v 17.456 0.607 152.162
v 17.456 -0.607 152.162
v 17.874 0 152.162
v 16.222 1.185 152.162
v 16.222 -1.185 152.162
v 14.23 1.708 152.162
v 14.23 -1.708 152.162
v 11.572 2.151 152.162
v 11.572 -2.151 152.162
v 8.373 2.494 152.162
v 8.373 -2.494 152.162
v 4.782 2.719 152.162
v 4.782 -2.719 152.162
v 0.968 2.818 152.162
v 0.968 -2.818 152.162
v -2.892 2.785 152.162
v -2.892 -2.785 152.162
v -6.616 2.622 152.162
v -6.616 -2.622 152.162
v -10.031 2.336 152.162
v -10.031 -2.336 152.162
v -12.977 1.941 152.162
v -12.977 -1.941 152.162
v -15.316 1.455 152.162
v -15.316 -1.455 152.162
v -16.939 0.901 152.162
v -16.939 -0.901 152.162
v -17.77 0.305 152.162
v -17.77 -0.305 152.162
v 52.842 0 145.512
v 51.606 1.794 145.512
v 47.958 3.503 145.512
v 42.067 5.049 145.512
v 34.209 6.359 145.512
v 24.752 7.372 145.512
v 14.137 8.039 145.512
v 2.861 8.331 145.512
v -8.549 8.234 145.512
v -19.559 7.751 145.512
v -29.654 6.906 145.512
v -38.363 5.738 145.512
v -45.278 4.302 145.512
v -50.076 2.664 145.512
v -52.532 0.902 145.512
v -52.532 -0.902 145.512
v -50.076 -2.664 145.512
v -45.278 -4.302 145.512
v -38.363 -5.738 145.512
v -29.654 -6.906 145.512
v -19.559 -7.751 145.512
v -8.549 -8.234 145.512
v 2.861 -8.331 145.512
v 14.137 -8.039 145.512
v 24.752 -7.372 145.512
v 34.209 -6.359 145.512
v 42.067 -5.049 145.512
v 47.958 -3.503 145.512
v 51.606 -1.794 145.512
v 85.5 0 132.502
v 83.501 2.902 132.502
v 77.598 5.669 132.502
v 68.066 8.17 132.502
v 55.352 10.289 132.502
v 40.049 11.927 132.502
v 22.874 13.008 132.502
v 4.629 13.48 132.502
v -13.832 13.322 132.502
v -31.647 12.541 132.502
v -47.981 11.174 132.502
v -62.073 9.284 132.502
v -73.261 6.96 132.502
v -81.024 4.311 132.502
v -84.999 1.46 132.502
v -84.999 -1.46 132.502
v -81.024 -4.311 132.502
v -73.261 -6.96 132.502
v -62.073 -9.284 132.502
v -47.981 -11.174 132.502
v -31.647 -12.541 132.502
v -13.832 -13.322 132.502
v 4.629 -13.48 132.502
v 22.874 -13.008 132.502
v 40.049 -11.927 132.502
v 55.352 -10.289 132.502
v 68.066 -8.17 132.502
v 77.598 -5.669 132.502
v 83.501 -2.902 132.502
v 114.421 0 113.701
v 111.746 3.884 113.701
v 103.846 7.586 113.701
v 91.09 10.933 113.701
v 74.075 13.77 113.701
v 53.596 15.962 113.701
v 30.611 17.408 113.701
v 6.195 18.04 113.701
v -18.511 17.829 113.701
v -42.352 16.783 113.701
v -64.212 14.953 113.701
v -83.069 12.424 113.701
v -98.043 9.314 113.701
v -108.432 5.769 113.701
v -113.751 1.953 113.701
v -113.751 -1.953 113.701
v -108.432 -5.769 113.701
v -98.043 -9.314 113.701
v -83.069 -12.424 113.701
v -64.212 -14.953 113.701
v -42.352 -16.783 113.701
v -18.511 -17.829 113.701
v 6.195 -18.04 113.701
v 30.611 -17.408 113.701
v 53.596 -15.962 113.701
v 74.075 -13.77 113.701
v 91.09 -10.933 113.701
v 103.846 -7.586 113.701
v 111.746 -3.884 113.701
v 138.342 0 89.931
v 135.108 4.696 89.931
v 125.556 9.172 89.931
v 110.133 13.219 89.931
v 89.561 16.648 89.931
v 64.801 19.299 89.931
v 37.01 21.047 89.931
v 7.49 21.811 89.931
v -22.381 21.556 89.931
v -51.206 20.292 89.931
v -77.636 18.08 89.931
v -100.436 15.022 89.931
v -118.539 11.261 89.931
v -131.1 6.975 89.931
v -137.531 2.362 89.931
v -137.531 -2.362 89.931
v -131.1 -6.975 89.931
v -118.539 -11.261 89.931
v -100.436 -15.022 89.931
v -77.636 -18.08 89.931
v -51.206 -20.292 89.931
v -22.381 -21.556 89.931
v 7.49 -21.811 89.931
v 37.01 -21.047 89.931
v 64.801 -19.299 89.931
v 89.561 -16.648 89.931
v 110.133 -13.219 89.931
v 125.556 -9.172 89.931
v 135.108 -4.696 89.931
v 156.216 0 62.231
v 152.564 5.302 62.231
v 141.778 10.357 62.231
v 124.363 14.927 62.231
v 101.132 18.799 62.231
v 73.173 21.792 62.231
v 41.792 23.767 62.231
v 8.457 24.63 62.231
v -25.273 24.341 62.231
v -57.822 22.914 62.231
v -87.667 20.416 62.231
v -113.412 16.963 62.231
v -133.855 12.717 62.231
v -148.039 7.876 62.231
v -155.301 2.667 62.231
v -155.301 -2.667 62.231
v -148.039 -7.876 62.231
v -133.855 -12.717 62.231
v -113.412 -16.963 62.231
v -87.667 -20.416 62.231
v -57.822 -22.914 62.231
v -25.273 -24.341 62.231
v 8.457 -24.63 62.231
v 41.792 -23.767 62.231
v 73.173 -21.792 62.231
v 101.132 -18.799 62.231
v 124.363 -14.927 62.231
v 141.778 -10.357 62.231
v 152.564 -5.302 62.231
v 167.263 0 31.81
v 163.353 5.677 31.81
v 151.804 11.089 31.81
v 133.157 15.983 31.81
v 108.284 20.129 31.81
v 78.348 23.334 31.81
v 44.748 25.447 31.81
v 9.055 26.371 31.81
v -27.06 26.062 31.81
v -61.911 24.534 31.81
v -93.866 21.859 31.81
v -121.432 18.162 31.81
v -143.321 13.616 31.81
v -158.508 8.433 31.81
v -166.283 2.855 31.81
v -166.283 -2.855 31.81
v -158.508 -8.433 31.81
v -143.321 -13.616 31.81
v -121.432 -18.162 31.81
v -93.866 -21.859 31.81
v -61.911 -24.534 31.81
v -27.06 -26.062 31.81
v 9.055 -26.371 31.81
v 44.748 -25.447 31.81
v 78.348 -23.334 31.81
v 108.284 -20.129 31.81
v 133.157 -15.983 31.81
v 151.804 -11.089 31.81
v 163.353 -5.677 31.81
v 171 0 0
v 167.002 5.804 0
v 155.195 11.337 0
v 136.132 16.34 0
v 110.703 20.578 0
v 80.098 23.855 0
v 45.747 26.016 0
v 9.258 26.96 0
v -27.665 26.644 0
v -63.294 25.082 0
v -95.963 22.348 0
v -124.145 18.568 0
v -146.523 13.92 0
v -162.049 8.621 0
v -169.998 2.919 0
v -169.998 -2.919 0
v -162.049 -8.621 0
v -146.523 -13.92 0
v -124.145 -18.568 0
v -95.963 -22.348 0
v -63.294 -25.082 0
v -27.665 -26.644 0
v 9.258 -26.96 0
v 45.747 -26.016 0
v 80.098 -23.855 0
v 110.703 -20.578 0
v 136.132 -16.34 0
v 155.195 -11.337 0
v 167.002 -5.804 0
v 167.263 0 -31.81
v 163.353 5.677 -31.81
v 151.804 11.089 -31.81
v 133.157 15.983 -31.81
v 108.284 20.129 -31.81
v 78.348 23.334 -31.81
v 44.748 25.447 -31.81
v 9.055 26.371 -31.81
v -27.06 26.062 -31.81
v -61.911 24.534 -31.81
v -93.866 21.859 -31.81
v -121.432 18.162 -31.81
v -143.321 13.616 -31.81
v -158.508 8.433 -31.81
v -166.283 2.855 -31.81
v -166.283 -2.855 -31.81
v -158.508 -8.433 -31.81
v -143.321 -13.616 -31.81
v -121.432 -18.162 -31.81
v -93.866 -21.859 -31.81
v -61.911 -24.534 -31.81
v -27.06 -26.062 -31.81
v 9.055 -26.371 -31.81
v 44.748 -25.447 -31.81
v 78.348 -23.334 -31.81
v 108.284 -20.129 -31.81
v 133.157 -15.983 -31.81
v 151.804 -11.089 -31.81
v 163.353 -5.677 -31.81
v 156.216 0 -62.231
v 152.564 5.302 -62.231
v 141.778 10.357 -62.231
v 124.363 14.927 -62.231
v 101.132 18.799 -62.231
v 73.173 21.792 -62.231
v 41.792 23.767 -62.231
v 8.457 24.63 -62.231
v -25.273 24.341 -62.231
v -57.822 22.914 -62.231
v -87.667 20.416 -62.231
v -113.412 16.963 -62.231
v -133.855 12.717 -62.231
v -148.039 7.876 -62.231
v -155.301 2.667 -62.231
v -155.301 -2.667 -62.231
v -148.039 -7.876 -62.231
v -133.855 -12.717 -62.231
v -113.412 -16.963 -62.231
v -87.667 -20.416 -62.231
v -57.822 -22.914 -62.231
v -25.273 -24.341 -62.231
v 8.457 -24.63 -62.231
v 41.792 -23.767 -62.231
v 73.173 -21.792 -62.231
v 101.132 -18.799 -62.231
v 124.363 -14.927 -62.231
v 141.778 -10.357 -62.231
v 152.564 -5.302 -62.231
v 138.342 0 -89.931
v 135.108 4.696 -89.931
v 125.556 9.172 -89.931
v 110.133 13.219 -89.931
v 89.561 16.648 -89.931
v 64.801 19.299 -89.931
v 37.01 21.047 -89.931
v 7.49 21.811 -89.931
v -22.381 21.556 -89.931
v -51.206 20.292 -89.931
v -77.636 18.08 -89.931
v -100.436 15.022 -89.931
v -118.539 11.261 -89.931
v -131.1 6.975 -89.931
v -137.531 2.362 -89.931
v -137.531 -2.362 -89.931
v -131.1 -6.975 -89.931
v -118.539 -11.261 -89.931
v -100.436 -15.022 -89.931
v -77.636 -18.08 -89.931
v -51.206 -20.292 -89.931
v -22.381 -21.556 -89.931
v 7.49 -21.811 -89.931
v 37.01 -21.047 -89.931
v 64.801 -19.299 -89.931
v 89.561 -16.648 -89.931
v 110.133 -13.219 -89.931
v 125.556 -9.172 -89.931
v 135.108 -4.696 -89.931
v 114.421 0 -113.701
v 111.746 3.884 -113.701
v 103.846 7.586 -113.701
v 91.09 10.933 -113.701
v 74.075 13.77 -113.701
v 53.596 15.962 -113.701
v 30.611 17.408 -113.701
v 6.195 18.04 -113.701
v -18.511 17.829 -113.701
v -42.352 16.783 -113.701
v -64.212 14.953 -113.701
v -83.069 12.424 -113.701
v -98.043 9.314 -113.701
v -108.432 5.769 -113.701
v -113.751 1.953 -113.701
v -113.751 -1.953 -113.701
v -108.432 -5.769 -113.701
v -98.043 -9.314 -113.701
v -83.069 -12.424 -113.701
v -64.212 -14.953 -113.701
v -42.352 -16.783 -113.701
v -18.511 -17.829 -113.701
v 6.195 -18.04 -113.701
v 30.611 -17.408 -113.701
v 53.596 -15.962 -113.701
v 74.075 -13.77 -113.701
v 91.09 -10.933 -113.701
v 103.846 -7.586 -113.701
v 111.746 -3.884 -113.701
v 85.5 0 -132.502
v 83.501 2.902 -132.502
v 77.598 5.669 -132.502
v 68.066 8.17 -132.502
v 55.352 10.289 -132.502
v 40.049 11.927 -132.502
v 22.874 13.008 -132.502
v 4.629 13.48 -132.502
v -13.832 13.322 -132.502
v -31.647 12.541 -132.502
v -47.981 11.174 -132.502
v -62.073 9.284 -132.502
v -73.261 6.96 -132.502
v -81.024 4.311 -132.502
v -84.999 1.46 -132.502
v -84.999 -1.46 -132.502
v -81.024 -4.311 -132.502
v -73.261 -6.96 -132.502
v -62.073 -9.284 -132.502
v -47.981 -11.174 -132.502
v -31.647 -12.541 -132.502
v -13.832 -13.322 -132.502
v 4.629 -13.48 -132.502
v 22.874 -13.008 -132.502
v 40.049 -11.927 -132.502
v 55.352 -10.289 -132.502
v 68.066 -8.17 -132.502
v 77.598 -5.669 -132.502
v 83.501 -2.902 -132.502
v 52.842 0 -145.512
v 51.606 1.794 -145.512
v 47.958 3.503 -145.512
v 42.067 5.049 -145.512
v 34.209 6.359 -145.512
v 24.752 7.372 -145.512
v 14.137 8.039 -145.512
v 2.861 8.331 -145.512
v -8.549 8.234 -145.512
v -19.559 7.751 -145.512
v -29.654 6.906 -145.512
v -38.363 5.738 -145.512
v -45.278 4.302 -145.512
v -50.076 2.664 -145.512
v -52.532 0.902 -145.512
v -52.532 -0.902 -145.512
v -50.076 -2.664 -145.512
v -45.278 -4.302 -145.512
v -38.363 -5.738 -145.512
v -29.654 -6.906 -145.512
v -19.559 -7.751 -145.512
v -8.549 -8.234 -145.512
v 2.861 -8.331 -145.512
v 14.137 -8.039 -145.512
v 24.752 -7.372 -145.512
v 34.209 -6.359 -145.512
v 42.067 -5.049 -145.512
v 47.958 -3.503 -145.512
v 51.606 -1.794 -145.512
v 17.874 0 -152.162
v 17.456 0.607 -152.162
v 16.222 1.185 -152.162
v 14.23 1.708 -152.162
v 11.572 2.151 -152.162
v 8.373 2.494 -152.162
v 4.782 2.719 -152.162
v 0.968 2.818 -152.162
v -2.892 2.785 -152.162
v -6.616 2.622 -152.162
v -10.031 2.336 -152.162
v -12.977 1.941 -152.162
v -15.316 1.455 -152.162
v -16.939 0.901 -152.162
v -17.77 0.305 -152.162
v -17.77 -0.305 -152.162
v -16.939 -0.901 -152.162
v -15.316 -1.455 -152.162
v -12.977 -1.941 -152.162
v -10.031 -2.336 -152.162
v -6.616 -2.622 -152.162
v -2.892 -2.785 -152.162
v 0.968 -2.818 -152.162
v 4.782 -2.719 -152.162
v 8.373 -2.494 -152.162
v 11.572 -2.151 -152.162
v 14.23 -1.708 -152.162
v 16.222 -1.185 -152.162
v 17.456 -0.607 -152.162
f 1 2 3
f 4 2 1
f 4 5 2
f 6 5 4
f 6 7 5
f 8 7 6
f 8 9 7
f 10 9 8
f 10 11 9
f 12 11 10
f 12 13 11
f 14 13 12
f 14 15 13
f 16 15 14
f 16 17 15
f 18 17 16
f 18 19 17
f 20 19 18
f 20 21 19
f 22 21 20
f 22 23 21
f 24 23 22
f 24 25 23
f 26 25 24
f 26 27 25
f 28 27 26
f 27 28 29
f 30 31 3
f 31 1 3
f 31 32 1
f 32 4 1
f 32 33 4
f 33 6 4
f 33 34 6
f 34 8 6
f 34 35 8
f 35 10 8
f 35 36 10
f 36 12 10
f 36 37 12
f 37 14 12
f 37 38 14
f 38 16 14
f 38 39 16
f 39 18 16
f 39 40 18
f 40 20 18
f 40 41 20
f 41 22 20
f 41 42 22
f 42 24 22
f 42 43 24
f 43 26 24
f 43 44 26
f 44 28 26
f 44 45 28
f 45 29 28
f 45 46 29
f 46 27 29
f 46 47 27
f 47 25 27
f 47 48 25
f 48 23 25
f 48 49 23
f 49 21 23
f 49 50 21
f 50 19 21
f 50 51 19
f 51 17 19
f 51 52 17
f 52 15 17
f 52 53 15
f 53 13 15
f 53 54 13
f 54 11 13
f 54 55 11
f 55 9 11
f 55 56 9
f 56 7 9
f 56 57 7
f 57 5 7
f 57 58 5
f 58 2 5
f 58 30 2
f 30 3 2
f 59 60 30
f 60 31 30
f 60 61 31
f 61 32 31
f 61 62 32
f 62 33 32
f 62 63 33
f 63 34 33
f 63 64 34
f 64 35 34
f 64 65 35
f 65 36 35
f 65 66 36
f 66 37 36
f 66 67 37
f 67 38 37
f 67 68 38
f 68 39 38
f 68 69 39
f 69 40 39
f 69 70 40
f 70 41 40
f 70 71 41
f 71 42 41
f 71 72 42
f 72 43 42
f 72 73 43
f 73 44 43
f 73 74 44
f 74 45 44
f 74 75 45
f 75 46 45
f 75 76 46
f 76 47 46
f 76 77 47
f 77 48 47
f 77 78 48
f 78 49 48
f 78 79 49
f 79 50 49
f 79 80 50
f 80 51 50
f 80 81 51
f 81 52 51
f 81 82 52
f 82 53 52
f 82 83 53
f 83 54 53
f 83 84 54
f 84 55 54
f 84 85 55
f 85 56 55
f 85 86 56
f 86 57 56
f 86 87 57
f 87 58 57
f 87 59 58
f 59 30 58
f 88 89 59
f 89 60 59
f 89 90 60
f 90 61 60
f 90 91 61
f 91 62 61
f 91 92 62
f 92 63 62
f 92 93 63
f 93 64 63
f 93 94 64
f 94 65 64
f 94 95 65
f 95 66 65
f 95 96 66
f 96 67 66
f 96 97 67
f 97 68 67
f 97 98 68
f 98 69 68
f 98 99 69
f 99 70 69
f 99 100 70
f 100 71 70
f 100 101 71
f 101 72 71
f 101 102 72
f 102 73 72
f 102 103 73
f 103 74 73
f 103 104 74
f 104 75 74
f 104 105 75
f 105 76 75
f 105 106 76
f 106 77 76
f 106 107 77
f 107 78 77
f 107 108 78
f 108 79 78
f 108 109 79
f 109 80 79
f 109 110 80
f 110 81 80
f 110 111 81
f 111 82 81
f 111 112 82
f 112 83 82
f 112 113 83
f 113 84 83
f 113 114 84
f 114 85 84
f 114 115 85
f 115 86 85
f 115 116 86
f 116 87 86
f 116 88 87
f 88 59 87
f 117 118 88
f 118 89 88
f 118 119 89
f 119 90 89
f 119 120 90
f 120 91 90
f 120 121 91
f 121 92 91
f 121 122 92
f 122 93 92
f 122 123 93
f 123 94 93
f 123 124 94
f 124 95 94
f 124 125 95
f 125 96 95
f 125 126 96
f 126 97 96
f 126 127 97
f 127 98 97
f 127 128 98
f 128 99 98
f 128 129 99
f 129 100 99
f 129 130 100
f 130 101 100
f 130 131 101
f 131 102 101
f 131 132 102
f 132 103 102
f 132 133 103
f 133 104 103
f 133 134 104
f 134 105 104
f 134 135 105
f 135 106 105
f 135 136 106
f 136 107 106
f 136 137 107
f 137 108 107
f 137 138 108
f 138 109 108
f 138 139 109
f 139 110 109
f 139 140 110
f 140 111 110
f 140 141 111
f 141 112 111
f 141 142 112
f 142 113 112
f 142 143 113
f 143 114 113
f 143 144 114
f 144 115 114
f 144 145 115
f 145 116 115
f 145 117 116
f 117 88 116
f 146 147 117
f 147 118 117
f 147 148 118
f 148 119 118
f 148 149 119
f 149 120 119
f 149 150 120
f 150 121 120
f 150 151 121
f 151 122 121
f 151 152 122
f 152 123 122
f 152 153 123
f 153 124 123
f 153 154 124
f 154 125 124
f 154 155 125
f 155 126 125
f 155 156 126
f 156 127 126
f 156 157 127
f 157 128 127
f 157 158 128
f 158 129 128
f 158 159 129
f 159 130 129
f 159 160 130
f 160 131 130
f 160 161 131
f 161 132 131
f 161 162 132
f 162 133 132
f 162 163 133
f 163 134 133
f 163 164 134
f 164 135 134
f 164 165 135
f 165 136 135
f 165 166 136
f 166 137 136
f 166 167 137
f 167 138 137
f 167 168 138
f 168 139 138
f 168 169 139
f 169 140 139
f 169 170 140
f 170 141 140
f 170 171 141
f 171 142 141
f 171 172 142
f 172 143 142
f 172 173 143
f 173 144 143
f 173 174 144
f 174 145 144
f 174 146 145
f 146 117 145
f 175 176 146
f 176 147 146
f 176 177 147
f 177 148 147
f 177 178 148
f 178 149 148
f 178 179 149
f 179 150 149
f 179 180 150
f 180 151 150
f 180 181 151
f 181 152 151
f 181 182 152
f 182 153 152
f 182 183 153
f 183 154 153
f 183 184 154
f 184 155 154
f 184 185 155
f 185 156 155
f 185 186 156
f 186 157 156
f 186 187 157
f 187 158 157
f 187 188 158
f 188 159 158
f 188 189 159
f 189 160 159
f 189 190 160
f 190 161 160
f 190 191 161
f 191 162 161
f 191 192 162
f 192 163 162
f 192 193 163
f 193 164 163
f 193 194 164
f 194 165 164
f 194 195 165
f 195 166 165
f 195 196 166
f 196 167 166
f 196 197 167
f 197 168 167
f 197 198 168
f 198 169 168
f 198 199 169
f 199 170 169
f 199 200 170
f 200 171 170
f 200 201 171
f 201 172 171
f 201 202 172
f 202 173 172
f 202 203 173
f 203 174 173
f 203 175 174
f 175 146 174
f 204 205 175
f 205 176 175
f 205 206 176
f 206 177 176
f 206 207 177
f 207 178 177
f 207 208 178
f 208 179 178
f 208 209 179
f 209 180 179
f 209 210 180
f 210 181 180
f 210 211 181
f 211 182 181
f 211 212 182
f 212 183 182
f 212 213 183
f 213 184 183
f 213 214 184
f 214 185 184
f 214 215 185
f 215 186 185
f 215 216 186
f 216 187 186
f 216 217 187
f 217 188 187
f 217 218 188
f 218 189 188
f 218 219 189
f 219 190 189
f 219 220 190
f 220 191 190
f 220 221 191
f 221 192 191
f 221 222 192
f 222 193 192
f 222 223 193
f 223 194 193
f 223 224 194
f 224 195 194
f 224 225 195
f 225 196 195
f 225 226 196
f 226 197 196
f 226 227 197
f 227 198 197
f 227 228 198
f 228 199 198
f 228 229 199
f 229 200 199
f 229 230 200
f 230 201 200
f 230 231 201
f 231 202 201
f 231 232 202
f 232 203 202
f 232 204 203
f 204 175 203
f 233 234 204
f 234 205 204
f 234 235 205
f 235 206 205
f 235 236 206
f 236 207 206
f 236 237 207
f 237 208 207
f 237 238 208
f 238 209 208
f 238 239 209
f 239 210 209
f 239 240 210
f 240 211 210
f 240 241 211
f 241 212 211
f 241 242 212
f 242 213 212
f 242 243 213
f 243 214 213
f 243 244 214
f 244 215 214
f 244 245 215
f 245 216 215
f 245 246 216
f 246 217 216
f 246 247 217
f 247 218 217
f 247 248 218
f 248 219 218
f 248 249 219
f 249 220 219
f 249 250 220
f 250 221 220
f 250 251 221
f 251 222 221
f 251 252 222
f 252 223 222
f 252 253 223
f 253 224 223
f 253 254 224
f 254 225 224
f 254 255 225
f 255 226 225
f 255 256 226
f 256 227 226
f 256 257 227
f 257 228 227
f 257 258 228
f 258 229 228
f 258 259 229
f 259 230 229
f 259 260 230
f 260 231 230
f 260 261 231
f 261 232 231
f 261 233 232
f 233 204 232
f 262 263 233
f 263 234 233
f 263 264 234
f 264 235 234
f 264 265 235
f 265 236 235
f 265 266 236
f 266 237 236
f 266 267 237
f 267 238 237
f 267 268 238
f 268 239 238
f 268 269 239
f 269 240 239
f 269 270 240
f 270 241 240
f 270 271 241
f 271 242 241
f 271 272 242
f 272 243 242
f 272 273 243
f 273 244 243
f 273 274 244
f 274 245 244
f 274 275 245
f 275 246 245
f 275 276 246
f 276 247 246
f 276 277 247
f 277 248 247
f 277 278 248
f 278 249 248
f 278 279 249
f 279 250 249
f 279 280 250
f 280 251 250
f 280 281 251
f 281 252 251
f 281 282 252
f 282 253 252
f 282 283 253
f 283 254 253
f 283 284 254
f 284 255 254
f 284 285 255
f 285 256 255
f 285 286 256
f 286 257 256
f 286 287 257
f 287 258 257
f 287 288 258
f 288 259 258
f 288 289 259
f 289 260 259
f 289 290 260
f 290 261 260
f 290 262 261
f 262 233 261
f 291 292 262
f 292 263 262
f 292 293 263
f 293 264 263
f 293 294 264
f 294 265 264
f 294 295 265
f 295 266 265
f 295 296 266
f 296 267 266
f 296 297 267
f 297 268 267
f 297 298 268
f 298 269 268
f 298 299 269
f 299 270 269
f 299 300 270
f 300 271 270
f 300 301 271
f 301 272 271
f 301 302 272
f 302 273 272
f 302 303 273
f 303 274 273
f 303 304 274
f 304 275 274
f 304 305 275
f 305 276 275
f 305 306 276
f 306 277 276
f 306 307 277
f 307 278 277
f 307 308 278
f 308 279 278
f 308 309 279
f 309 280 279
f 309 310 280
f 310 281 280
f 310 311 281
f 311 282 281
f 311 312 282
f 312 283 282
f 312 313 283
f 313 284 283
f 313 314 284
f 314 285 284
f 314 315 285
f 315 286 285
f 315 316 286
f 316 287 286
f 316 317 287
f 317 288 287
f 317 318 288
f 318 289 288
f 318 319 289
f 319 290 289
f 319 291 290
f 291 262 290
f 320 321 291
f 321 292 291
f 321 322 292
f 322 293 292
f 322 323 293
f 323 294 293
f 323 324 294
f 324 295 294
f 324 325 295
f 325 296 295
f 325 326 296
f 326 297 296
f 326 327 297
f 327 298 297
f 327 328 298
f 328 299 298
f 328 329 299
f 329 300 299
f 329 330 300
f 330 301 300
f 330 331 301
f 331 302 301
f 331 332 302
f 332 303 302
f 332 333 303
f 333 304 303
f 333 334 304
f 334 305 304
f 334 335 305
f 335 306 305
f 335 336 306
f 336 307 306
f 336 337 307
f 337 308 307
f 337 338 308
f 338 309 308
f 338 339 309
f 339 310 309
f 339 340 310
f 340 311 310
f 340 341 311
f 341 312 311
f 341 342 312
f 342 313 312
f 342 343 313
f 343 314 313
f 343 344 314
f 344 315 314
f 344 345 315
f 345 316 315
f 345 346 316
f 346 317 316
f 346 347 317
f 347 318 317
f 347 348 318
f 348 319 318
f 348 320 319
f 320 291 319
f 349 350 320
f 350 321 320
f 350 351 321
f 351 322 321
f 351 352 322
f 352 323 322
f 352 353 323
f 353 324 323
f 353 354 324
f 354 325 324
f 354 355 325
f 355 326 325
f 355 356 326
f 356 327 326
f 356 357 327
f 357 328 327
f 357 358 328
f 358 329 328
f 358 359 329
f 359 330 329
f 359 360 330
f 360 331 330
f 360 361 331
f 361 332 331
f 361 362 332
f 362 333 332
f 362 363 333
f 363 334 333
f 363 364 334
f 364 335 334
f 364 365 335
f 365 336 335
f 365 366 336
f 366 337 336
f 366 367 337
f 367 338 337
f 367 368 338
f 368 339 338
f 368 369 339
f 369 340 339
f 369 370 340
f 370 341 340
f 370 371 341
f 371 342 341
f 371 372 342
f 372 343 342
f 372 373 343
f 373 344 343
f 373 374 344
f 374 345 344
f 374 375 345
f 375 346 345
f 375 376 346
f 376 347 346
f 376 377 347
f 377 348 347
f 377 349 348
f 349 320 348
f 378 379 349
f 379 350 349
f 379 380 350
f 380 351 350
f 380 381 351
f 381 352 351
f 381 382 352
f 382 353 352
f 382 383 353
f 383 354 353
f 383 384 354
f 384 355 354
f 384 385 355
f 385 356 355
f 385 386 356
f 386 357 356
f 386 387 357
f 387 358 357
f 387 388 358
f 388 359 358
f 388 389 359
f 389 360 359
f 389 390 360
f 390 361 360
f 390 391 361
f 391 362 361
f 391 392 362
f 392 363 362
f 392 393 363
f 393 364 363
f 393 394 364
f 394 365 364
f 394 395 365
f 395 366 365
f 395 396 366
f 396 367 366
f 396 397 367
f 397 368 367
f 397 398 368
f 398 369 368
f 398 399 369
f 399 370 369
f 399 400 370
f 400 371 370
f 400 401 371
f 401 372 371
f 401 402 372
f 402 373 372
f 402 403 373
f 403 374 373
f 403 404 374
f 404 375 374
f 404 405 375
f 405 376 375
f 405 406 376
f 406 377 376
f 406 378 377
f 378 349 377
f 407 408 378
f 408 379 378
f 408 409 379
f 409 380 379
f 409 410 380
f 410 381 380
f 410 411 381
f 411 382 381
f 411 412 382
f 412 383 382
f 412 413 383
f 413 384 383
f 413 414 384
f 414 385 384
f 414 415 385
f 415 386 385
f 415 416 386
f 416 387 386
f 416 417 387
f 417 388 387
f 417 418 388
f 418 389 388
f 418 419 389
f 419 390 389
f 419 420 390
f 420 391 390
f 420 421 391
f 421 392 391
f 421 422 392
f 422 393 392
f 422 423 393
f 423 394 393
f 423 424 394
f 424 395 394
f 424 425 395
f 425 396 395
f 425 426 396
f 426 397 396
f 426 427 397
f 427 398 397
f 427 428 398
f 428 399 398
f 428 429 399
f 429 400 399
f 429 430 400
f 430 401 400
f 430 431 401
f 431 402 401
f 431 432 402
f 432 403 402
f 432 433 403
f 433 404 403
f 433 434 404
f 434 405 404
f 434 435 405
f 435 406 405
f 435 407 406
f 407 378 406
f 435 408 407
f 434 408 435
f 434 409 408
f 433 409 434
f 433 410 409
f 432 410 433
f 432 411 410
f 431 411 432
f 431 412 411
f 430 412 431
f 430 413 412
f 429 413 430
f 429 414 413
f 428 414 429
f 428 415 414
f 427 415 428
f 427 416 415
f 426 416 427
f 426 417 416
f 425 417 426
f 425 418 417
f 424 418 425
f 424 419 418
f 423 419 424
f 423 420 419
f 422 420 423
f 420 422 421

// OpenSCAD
// Generated by SolidPython 1.0.1 on 2020-07-29 00:46:53


scale(v = [19, 3, 17]) {
	sphere(r = 9);
}
/***********************************************
*********      SolidPython code:      **********
************************************************
 
# import packages: SolidPython
from solid import *
from solid.utils import *
from itertools import chain, combinations, permutations


class Resize:

    def __init__(self, scad_file):
        self.scad_file = scad_file
        #self.scad_file = import_scad(scad_file)
        # cone/cylinder param:
        self.r1 = 0
        self.r2 = 0
        self.h = 0
        # rectangular prism param:
        self.w = 0
        self.l = 0
        # ellipse param:
        self.r = 0

    # import OpenScad code (file name corresponds to shape)


    # classify shape + parameters
    def assign(self, param1, param2, param3):
        if self.scad_file == 'cone.scad':
            self.r1 = param1
            self.r2 = param2
            self.h = param3
        elif self.scad_file == 'cylinder.scad':
            self.r1 = param1
            self.r2 = param2
            self.h = param3
        elif self.scad_file == 'rectangularPrism.scad':
            self.h = param1
            self.l = param2
            self.w = param3
        else:
            self.r = param1
            self.h = param2

    # resize parameters
    def iterate(self):
        x = range(3, 20, 2)
        i = 1
        if self.scad_file == 'cone.scad':
            tempList = list(permutations(x, 2))
            for temp in tempList:
                param1 = temp[0]
                param2 = temp[1]
                filepath = 'produced_scad_files/' + 'cone' + str(param1) + '_' + str(param2) + '_' + '.scad'
                scad_render_to_file(cylinder(h=param1, r1=param2, r2=0), filepath)

        elif self.scad_file == 'cylinder.scad':
            tempList = list(permutations(x, 3))
            for temp in tempList:
                param1 = temp[0]
                param2 = temp[1]
                filepath = 'produced_scad_files/' + 'cylinder' + str(param1) + '_' + str(param2) + '_' + '.scad'
                scad_render_to_file(cylinder(h=param1, r1=param2, r2=param2), filepath)

        elif self.scad_file == 'rectangularPrism.scad':
            tempList = list(permutations(x, 3))
            for temp in tempList:
                param1 = temp[0]
                param2 = temp[1]
                param3 = temp[2]
                filepath = 'produced_scad_files/' + 'rectangularPrism' + str(param1) + '_' + str(param2) + '_' + str(
                    param3) + '.scad'
                scad_render_to_file(cube(size=(param1, param2, param3)), filepath)

        elif self.scad_file == 'ellipse.scad':
            tempList = list(permutations(x, 4))
            for temp in tempList:
                param1 = temp[0]
                param2 = temp[1]
                param3 = temp[2]
                param4 = temp[3]
                filepath = 'produced_scad_files/' + 'ellipse' + str(param1) + '_' + str(param2) + '_' + str(param3) + '_' + str(param4) + '.scad'
                scad_render_to_file(scale([param1, param2, param3])(sphere(r=param4)), filepath)

    def render_to_scadfile(self):
        scad_render_to_file(scad, 'example.scad') 
 
************************************************/
